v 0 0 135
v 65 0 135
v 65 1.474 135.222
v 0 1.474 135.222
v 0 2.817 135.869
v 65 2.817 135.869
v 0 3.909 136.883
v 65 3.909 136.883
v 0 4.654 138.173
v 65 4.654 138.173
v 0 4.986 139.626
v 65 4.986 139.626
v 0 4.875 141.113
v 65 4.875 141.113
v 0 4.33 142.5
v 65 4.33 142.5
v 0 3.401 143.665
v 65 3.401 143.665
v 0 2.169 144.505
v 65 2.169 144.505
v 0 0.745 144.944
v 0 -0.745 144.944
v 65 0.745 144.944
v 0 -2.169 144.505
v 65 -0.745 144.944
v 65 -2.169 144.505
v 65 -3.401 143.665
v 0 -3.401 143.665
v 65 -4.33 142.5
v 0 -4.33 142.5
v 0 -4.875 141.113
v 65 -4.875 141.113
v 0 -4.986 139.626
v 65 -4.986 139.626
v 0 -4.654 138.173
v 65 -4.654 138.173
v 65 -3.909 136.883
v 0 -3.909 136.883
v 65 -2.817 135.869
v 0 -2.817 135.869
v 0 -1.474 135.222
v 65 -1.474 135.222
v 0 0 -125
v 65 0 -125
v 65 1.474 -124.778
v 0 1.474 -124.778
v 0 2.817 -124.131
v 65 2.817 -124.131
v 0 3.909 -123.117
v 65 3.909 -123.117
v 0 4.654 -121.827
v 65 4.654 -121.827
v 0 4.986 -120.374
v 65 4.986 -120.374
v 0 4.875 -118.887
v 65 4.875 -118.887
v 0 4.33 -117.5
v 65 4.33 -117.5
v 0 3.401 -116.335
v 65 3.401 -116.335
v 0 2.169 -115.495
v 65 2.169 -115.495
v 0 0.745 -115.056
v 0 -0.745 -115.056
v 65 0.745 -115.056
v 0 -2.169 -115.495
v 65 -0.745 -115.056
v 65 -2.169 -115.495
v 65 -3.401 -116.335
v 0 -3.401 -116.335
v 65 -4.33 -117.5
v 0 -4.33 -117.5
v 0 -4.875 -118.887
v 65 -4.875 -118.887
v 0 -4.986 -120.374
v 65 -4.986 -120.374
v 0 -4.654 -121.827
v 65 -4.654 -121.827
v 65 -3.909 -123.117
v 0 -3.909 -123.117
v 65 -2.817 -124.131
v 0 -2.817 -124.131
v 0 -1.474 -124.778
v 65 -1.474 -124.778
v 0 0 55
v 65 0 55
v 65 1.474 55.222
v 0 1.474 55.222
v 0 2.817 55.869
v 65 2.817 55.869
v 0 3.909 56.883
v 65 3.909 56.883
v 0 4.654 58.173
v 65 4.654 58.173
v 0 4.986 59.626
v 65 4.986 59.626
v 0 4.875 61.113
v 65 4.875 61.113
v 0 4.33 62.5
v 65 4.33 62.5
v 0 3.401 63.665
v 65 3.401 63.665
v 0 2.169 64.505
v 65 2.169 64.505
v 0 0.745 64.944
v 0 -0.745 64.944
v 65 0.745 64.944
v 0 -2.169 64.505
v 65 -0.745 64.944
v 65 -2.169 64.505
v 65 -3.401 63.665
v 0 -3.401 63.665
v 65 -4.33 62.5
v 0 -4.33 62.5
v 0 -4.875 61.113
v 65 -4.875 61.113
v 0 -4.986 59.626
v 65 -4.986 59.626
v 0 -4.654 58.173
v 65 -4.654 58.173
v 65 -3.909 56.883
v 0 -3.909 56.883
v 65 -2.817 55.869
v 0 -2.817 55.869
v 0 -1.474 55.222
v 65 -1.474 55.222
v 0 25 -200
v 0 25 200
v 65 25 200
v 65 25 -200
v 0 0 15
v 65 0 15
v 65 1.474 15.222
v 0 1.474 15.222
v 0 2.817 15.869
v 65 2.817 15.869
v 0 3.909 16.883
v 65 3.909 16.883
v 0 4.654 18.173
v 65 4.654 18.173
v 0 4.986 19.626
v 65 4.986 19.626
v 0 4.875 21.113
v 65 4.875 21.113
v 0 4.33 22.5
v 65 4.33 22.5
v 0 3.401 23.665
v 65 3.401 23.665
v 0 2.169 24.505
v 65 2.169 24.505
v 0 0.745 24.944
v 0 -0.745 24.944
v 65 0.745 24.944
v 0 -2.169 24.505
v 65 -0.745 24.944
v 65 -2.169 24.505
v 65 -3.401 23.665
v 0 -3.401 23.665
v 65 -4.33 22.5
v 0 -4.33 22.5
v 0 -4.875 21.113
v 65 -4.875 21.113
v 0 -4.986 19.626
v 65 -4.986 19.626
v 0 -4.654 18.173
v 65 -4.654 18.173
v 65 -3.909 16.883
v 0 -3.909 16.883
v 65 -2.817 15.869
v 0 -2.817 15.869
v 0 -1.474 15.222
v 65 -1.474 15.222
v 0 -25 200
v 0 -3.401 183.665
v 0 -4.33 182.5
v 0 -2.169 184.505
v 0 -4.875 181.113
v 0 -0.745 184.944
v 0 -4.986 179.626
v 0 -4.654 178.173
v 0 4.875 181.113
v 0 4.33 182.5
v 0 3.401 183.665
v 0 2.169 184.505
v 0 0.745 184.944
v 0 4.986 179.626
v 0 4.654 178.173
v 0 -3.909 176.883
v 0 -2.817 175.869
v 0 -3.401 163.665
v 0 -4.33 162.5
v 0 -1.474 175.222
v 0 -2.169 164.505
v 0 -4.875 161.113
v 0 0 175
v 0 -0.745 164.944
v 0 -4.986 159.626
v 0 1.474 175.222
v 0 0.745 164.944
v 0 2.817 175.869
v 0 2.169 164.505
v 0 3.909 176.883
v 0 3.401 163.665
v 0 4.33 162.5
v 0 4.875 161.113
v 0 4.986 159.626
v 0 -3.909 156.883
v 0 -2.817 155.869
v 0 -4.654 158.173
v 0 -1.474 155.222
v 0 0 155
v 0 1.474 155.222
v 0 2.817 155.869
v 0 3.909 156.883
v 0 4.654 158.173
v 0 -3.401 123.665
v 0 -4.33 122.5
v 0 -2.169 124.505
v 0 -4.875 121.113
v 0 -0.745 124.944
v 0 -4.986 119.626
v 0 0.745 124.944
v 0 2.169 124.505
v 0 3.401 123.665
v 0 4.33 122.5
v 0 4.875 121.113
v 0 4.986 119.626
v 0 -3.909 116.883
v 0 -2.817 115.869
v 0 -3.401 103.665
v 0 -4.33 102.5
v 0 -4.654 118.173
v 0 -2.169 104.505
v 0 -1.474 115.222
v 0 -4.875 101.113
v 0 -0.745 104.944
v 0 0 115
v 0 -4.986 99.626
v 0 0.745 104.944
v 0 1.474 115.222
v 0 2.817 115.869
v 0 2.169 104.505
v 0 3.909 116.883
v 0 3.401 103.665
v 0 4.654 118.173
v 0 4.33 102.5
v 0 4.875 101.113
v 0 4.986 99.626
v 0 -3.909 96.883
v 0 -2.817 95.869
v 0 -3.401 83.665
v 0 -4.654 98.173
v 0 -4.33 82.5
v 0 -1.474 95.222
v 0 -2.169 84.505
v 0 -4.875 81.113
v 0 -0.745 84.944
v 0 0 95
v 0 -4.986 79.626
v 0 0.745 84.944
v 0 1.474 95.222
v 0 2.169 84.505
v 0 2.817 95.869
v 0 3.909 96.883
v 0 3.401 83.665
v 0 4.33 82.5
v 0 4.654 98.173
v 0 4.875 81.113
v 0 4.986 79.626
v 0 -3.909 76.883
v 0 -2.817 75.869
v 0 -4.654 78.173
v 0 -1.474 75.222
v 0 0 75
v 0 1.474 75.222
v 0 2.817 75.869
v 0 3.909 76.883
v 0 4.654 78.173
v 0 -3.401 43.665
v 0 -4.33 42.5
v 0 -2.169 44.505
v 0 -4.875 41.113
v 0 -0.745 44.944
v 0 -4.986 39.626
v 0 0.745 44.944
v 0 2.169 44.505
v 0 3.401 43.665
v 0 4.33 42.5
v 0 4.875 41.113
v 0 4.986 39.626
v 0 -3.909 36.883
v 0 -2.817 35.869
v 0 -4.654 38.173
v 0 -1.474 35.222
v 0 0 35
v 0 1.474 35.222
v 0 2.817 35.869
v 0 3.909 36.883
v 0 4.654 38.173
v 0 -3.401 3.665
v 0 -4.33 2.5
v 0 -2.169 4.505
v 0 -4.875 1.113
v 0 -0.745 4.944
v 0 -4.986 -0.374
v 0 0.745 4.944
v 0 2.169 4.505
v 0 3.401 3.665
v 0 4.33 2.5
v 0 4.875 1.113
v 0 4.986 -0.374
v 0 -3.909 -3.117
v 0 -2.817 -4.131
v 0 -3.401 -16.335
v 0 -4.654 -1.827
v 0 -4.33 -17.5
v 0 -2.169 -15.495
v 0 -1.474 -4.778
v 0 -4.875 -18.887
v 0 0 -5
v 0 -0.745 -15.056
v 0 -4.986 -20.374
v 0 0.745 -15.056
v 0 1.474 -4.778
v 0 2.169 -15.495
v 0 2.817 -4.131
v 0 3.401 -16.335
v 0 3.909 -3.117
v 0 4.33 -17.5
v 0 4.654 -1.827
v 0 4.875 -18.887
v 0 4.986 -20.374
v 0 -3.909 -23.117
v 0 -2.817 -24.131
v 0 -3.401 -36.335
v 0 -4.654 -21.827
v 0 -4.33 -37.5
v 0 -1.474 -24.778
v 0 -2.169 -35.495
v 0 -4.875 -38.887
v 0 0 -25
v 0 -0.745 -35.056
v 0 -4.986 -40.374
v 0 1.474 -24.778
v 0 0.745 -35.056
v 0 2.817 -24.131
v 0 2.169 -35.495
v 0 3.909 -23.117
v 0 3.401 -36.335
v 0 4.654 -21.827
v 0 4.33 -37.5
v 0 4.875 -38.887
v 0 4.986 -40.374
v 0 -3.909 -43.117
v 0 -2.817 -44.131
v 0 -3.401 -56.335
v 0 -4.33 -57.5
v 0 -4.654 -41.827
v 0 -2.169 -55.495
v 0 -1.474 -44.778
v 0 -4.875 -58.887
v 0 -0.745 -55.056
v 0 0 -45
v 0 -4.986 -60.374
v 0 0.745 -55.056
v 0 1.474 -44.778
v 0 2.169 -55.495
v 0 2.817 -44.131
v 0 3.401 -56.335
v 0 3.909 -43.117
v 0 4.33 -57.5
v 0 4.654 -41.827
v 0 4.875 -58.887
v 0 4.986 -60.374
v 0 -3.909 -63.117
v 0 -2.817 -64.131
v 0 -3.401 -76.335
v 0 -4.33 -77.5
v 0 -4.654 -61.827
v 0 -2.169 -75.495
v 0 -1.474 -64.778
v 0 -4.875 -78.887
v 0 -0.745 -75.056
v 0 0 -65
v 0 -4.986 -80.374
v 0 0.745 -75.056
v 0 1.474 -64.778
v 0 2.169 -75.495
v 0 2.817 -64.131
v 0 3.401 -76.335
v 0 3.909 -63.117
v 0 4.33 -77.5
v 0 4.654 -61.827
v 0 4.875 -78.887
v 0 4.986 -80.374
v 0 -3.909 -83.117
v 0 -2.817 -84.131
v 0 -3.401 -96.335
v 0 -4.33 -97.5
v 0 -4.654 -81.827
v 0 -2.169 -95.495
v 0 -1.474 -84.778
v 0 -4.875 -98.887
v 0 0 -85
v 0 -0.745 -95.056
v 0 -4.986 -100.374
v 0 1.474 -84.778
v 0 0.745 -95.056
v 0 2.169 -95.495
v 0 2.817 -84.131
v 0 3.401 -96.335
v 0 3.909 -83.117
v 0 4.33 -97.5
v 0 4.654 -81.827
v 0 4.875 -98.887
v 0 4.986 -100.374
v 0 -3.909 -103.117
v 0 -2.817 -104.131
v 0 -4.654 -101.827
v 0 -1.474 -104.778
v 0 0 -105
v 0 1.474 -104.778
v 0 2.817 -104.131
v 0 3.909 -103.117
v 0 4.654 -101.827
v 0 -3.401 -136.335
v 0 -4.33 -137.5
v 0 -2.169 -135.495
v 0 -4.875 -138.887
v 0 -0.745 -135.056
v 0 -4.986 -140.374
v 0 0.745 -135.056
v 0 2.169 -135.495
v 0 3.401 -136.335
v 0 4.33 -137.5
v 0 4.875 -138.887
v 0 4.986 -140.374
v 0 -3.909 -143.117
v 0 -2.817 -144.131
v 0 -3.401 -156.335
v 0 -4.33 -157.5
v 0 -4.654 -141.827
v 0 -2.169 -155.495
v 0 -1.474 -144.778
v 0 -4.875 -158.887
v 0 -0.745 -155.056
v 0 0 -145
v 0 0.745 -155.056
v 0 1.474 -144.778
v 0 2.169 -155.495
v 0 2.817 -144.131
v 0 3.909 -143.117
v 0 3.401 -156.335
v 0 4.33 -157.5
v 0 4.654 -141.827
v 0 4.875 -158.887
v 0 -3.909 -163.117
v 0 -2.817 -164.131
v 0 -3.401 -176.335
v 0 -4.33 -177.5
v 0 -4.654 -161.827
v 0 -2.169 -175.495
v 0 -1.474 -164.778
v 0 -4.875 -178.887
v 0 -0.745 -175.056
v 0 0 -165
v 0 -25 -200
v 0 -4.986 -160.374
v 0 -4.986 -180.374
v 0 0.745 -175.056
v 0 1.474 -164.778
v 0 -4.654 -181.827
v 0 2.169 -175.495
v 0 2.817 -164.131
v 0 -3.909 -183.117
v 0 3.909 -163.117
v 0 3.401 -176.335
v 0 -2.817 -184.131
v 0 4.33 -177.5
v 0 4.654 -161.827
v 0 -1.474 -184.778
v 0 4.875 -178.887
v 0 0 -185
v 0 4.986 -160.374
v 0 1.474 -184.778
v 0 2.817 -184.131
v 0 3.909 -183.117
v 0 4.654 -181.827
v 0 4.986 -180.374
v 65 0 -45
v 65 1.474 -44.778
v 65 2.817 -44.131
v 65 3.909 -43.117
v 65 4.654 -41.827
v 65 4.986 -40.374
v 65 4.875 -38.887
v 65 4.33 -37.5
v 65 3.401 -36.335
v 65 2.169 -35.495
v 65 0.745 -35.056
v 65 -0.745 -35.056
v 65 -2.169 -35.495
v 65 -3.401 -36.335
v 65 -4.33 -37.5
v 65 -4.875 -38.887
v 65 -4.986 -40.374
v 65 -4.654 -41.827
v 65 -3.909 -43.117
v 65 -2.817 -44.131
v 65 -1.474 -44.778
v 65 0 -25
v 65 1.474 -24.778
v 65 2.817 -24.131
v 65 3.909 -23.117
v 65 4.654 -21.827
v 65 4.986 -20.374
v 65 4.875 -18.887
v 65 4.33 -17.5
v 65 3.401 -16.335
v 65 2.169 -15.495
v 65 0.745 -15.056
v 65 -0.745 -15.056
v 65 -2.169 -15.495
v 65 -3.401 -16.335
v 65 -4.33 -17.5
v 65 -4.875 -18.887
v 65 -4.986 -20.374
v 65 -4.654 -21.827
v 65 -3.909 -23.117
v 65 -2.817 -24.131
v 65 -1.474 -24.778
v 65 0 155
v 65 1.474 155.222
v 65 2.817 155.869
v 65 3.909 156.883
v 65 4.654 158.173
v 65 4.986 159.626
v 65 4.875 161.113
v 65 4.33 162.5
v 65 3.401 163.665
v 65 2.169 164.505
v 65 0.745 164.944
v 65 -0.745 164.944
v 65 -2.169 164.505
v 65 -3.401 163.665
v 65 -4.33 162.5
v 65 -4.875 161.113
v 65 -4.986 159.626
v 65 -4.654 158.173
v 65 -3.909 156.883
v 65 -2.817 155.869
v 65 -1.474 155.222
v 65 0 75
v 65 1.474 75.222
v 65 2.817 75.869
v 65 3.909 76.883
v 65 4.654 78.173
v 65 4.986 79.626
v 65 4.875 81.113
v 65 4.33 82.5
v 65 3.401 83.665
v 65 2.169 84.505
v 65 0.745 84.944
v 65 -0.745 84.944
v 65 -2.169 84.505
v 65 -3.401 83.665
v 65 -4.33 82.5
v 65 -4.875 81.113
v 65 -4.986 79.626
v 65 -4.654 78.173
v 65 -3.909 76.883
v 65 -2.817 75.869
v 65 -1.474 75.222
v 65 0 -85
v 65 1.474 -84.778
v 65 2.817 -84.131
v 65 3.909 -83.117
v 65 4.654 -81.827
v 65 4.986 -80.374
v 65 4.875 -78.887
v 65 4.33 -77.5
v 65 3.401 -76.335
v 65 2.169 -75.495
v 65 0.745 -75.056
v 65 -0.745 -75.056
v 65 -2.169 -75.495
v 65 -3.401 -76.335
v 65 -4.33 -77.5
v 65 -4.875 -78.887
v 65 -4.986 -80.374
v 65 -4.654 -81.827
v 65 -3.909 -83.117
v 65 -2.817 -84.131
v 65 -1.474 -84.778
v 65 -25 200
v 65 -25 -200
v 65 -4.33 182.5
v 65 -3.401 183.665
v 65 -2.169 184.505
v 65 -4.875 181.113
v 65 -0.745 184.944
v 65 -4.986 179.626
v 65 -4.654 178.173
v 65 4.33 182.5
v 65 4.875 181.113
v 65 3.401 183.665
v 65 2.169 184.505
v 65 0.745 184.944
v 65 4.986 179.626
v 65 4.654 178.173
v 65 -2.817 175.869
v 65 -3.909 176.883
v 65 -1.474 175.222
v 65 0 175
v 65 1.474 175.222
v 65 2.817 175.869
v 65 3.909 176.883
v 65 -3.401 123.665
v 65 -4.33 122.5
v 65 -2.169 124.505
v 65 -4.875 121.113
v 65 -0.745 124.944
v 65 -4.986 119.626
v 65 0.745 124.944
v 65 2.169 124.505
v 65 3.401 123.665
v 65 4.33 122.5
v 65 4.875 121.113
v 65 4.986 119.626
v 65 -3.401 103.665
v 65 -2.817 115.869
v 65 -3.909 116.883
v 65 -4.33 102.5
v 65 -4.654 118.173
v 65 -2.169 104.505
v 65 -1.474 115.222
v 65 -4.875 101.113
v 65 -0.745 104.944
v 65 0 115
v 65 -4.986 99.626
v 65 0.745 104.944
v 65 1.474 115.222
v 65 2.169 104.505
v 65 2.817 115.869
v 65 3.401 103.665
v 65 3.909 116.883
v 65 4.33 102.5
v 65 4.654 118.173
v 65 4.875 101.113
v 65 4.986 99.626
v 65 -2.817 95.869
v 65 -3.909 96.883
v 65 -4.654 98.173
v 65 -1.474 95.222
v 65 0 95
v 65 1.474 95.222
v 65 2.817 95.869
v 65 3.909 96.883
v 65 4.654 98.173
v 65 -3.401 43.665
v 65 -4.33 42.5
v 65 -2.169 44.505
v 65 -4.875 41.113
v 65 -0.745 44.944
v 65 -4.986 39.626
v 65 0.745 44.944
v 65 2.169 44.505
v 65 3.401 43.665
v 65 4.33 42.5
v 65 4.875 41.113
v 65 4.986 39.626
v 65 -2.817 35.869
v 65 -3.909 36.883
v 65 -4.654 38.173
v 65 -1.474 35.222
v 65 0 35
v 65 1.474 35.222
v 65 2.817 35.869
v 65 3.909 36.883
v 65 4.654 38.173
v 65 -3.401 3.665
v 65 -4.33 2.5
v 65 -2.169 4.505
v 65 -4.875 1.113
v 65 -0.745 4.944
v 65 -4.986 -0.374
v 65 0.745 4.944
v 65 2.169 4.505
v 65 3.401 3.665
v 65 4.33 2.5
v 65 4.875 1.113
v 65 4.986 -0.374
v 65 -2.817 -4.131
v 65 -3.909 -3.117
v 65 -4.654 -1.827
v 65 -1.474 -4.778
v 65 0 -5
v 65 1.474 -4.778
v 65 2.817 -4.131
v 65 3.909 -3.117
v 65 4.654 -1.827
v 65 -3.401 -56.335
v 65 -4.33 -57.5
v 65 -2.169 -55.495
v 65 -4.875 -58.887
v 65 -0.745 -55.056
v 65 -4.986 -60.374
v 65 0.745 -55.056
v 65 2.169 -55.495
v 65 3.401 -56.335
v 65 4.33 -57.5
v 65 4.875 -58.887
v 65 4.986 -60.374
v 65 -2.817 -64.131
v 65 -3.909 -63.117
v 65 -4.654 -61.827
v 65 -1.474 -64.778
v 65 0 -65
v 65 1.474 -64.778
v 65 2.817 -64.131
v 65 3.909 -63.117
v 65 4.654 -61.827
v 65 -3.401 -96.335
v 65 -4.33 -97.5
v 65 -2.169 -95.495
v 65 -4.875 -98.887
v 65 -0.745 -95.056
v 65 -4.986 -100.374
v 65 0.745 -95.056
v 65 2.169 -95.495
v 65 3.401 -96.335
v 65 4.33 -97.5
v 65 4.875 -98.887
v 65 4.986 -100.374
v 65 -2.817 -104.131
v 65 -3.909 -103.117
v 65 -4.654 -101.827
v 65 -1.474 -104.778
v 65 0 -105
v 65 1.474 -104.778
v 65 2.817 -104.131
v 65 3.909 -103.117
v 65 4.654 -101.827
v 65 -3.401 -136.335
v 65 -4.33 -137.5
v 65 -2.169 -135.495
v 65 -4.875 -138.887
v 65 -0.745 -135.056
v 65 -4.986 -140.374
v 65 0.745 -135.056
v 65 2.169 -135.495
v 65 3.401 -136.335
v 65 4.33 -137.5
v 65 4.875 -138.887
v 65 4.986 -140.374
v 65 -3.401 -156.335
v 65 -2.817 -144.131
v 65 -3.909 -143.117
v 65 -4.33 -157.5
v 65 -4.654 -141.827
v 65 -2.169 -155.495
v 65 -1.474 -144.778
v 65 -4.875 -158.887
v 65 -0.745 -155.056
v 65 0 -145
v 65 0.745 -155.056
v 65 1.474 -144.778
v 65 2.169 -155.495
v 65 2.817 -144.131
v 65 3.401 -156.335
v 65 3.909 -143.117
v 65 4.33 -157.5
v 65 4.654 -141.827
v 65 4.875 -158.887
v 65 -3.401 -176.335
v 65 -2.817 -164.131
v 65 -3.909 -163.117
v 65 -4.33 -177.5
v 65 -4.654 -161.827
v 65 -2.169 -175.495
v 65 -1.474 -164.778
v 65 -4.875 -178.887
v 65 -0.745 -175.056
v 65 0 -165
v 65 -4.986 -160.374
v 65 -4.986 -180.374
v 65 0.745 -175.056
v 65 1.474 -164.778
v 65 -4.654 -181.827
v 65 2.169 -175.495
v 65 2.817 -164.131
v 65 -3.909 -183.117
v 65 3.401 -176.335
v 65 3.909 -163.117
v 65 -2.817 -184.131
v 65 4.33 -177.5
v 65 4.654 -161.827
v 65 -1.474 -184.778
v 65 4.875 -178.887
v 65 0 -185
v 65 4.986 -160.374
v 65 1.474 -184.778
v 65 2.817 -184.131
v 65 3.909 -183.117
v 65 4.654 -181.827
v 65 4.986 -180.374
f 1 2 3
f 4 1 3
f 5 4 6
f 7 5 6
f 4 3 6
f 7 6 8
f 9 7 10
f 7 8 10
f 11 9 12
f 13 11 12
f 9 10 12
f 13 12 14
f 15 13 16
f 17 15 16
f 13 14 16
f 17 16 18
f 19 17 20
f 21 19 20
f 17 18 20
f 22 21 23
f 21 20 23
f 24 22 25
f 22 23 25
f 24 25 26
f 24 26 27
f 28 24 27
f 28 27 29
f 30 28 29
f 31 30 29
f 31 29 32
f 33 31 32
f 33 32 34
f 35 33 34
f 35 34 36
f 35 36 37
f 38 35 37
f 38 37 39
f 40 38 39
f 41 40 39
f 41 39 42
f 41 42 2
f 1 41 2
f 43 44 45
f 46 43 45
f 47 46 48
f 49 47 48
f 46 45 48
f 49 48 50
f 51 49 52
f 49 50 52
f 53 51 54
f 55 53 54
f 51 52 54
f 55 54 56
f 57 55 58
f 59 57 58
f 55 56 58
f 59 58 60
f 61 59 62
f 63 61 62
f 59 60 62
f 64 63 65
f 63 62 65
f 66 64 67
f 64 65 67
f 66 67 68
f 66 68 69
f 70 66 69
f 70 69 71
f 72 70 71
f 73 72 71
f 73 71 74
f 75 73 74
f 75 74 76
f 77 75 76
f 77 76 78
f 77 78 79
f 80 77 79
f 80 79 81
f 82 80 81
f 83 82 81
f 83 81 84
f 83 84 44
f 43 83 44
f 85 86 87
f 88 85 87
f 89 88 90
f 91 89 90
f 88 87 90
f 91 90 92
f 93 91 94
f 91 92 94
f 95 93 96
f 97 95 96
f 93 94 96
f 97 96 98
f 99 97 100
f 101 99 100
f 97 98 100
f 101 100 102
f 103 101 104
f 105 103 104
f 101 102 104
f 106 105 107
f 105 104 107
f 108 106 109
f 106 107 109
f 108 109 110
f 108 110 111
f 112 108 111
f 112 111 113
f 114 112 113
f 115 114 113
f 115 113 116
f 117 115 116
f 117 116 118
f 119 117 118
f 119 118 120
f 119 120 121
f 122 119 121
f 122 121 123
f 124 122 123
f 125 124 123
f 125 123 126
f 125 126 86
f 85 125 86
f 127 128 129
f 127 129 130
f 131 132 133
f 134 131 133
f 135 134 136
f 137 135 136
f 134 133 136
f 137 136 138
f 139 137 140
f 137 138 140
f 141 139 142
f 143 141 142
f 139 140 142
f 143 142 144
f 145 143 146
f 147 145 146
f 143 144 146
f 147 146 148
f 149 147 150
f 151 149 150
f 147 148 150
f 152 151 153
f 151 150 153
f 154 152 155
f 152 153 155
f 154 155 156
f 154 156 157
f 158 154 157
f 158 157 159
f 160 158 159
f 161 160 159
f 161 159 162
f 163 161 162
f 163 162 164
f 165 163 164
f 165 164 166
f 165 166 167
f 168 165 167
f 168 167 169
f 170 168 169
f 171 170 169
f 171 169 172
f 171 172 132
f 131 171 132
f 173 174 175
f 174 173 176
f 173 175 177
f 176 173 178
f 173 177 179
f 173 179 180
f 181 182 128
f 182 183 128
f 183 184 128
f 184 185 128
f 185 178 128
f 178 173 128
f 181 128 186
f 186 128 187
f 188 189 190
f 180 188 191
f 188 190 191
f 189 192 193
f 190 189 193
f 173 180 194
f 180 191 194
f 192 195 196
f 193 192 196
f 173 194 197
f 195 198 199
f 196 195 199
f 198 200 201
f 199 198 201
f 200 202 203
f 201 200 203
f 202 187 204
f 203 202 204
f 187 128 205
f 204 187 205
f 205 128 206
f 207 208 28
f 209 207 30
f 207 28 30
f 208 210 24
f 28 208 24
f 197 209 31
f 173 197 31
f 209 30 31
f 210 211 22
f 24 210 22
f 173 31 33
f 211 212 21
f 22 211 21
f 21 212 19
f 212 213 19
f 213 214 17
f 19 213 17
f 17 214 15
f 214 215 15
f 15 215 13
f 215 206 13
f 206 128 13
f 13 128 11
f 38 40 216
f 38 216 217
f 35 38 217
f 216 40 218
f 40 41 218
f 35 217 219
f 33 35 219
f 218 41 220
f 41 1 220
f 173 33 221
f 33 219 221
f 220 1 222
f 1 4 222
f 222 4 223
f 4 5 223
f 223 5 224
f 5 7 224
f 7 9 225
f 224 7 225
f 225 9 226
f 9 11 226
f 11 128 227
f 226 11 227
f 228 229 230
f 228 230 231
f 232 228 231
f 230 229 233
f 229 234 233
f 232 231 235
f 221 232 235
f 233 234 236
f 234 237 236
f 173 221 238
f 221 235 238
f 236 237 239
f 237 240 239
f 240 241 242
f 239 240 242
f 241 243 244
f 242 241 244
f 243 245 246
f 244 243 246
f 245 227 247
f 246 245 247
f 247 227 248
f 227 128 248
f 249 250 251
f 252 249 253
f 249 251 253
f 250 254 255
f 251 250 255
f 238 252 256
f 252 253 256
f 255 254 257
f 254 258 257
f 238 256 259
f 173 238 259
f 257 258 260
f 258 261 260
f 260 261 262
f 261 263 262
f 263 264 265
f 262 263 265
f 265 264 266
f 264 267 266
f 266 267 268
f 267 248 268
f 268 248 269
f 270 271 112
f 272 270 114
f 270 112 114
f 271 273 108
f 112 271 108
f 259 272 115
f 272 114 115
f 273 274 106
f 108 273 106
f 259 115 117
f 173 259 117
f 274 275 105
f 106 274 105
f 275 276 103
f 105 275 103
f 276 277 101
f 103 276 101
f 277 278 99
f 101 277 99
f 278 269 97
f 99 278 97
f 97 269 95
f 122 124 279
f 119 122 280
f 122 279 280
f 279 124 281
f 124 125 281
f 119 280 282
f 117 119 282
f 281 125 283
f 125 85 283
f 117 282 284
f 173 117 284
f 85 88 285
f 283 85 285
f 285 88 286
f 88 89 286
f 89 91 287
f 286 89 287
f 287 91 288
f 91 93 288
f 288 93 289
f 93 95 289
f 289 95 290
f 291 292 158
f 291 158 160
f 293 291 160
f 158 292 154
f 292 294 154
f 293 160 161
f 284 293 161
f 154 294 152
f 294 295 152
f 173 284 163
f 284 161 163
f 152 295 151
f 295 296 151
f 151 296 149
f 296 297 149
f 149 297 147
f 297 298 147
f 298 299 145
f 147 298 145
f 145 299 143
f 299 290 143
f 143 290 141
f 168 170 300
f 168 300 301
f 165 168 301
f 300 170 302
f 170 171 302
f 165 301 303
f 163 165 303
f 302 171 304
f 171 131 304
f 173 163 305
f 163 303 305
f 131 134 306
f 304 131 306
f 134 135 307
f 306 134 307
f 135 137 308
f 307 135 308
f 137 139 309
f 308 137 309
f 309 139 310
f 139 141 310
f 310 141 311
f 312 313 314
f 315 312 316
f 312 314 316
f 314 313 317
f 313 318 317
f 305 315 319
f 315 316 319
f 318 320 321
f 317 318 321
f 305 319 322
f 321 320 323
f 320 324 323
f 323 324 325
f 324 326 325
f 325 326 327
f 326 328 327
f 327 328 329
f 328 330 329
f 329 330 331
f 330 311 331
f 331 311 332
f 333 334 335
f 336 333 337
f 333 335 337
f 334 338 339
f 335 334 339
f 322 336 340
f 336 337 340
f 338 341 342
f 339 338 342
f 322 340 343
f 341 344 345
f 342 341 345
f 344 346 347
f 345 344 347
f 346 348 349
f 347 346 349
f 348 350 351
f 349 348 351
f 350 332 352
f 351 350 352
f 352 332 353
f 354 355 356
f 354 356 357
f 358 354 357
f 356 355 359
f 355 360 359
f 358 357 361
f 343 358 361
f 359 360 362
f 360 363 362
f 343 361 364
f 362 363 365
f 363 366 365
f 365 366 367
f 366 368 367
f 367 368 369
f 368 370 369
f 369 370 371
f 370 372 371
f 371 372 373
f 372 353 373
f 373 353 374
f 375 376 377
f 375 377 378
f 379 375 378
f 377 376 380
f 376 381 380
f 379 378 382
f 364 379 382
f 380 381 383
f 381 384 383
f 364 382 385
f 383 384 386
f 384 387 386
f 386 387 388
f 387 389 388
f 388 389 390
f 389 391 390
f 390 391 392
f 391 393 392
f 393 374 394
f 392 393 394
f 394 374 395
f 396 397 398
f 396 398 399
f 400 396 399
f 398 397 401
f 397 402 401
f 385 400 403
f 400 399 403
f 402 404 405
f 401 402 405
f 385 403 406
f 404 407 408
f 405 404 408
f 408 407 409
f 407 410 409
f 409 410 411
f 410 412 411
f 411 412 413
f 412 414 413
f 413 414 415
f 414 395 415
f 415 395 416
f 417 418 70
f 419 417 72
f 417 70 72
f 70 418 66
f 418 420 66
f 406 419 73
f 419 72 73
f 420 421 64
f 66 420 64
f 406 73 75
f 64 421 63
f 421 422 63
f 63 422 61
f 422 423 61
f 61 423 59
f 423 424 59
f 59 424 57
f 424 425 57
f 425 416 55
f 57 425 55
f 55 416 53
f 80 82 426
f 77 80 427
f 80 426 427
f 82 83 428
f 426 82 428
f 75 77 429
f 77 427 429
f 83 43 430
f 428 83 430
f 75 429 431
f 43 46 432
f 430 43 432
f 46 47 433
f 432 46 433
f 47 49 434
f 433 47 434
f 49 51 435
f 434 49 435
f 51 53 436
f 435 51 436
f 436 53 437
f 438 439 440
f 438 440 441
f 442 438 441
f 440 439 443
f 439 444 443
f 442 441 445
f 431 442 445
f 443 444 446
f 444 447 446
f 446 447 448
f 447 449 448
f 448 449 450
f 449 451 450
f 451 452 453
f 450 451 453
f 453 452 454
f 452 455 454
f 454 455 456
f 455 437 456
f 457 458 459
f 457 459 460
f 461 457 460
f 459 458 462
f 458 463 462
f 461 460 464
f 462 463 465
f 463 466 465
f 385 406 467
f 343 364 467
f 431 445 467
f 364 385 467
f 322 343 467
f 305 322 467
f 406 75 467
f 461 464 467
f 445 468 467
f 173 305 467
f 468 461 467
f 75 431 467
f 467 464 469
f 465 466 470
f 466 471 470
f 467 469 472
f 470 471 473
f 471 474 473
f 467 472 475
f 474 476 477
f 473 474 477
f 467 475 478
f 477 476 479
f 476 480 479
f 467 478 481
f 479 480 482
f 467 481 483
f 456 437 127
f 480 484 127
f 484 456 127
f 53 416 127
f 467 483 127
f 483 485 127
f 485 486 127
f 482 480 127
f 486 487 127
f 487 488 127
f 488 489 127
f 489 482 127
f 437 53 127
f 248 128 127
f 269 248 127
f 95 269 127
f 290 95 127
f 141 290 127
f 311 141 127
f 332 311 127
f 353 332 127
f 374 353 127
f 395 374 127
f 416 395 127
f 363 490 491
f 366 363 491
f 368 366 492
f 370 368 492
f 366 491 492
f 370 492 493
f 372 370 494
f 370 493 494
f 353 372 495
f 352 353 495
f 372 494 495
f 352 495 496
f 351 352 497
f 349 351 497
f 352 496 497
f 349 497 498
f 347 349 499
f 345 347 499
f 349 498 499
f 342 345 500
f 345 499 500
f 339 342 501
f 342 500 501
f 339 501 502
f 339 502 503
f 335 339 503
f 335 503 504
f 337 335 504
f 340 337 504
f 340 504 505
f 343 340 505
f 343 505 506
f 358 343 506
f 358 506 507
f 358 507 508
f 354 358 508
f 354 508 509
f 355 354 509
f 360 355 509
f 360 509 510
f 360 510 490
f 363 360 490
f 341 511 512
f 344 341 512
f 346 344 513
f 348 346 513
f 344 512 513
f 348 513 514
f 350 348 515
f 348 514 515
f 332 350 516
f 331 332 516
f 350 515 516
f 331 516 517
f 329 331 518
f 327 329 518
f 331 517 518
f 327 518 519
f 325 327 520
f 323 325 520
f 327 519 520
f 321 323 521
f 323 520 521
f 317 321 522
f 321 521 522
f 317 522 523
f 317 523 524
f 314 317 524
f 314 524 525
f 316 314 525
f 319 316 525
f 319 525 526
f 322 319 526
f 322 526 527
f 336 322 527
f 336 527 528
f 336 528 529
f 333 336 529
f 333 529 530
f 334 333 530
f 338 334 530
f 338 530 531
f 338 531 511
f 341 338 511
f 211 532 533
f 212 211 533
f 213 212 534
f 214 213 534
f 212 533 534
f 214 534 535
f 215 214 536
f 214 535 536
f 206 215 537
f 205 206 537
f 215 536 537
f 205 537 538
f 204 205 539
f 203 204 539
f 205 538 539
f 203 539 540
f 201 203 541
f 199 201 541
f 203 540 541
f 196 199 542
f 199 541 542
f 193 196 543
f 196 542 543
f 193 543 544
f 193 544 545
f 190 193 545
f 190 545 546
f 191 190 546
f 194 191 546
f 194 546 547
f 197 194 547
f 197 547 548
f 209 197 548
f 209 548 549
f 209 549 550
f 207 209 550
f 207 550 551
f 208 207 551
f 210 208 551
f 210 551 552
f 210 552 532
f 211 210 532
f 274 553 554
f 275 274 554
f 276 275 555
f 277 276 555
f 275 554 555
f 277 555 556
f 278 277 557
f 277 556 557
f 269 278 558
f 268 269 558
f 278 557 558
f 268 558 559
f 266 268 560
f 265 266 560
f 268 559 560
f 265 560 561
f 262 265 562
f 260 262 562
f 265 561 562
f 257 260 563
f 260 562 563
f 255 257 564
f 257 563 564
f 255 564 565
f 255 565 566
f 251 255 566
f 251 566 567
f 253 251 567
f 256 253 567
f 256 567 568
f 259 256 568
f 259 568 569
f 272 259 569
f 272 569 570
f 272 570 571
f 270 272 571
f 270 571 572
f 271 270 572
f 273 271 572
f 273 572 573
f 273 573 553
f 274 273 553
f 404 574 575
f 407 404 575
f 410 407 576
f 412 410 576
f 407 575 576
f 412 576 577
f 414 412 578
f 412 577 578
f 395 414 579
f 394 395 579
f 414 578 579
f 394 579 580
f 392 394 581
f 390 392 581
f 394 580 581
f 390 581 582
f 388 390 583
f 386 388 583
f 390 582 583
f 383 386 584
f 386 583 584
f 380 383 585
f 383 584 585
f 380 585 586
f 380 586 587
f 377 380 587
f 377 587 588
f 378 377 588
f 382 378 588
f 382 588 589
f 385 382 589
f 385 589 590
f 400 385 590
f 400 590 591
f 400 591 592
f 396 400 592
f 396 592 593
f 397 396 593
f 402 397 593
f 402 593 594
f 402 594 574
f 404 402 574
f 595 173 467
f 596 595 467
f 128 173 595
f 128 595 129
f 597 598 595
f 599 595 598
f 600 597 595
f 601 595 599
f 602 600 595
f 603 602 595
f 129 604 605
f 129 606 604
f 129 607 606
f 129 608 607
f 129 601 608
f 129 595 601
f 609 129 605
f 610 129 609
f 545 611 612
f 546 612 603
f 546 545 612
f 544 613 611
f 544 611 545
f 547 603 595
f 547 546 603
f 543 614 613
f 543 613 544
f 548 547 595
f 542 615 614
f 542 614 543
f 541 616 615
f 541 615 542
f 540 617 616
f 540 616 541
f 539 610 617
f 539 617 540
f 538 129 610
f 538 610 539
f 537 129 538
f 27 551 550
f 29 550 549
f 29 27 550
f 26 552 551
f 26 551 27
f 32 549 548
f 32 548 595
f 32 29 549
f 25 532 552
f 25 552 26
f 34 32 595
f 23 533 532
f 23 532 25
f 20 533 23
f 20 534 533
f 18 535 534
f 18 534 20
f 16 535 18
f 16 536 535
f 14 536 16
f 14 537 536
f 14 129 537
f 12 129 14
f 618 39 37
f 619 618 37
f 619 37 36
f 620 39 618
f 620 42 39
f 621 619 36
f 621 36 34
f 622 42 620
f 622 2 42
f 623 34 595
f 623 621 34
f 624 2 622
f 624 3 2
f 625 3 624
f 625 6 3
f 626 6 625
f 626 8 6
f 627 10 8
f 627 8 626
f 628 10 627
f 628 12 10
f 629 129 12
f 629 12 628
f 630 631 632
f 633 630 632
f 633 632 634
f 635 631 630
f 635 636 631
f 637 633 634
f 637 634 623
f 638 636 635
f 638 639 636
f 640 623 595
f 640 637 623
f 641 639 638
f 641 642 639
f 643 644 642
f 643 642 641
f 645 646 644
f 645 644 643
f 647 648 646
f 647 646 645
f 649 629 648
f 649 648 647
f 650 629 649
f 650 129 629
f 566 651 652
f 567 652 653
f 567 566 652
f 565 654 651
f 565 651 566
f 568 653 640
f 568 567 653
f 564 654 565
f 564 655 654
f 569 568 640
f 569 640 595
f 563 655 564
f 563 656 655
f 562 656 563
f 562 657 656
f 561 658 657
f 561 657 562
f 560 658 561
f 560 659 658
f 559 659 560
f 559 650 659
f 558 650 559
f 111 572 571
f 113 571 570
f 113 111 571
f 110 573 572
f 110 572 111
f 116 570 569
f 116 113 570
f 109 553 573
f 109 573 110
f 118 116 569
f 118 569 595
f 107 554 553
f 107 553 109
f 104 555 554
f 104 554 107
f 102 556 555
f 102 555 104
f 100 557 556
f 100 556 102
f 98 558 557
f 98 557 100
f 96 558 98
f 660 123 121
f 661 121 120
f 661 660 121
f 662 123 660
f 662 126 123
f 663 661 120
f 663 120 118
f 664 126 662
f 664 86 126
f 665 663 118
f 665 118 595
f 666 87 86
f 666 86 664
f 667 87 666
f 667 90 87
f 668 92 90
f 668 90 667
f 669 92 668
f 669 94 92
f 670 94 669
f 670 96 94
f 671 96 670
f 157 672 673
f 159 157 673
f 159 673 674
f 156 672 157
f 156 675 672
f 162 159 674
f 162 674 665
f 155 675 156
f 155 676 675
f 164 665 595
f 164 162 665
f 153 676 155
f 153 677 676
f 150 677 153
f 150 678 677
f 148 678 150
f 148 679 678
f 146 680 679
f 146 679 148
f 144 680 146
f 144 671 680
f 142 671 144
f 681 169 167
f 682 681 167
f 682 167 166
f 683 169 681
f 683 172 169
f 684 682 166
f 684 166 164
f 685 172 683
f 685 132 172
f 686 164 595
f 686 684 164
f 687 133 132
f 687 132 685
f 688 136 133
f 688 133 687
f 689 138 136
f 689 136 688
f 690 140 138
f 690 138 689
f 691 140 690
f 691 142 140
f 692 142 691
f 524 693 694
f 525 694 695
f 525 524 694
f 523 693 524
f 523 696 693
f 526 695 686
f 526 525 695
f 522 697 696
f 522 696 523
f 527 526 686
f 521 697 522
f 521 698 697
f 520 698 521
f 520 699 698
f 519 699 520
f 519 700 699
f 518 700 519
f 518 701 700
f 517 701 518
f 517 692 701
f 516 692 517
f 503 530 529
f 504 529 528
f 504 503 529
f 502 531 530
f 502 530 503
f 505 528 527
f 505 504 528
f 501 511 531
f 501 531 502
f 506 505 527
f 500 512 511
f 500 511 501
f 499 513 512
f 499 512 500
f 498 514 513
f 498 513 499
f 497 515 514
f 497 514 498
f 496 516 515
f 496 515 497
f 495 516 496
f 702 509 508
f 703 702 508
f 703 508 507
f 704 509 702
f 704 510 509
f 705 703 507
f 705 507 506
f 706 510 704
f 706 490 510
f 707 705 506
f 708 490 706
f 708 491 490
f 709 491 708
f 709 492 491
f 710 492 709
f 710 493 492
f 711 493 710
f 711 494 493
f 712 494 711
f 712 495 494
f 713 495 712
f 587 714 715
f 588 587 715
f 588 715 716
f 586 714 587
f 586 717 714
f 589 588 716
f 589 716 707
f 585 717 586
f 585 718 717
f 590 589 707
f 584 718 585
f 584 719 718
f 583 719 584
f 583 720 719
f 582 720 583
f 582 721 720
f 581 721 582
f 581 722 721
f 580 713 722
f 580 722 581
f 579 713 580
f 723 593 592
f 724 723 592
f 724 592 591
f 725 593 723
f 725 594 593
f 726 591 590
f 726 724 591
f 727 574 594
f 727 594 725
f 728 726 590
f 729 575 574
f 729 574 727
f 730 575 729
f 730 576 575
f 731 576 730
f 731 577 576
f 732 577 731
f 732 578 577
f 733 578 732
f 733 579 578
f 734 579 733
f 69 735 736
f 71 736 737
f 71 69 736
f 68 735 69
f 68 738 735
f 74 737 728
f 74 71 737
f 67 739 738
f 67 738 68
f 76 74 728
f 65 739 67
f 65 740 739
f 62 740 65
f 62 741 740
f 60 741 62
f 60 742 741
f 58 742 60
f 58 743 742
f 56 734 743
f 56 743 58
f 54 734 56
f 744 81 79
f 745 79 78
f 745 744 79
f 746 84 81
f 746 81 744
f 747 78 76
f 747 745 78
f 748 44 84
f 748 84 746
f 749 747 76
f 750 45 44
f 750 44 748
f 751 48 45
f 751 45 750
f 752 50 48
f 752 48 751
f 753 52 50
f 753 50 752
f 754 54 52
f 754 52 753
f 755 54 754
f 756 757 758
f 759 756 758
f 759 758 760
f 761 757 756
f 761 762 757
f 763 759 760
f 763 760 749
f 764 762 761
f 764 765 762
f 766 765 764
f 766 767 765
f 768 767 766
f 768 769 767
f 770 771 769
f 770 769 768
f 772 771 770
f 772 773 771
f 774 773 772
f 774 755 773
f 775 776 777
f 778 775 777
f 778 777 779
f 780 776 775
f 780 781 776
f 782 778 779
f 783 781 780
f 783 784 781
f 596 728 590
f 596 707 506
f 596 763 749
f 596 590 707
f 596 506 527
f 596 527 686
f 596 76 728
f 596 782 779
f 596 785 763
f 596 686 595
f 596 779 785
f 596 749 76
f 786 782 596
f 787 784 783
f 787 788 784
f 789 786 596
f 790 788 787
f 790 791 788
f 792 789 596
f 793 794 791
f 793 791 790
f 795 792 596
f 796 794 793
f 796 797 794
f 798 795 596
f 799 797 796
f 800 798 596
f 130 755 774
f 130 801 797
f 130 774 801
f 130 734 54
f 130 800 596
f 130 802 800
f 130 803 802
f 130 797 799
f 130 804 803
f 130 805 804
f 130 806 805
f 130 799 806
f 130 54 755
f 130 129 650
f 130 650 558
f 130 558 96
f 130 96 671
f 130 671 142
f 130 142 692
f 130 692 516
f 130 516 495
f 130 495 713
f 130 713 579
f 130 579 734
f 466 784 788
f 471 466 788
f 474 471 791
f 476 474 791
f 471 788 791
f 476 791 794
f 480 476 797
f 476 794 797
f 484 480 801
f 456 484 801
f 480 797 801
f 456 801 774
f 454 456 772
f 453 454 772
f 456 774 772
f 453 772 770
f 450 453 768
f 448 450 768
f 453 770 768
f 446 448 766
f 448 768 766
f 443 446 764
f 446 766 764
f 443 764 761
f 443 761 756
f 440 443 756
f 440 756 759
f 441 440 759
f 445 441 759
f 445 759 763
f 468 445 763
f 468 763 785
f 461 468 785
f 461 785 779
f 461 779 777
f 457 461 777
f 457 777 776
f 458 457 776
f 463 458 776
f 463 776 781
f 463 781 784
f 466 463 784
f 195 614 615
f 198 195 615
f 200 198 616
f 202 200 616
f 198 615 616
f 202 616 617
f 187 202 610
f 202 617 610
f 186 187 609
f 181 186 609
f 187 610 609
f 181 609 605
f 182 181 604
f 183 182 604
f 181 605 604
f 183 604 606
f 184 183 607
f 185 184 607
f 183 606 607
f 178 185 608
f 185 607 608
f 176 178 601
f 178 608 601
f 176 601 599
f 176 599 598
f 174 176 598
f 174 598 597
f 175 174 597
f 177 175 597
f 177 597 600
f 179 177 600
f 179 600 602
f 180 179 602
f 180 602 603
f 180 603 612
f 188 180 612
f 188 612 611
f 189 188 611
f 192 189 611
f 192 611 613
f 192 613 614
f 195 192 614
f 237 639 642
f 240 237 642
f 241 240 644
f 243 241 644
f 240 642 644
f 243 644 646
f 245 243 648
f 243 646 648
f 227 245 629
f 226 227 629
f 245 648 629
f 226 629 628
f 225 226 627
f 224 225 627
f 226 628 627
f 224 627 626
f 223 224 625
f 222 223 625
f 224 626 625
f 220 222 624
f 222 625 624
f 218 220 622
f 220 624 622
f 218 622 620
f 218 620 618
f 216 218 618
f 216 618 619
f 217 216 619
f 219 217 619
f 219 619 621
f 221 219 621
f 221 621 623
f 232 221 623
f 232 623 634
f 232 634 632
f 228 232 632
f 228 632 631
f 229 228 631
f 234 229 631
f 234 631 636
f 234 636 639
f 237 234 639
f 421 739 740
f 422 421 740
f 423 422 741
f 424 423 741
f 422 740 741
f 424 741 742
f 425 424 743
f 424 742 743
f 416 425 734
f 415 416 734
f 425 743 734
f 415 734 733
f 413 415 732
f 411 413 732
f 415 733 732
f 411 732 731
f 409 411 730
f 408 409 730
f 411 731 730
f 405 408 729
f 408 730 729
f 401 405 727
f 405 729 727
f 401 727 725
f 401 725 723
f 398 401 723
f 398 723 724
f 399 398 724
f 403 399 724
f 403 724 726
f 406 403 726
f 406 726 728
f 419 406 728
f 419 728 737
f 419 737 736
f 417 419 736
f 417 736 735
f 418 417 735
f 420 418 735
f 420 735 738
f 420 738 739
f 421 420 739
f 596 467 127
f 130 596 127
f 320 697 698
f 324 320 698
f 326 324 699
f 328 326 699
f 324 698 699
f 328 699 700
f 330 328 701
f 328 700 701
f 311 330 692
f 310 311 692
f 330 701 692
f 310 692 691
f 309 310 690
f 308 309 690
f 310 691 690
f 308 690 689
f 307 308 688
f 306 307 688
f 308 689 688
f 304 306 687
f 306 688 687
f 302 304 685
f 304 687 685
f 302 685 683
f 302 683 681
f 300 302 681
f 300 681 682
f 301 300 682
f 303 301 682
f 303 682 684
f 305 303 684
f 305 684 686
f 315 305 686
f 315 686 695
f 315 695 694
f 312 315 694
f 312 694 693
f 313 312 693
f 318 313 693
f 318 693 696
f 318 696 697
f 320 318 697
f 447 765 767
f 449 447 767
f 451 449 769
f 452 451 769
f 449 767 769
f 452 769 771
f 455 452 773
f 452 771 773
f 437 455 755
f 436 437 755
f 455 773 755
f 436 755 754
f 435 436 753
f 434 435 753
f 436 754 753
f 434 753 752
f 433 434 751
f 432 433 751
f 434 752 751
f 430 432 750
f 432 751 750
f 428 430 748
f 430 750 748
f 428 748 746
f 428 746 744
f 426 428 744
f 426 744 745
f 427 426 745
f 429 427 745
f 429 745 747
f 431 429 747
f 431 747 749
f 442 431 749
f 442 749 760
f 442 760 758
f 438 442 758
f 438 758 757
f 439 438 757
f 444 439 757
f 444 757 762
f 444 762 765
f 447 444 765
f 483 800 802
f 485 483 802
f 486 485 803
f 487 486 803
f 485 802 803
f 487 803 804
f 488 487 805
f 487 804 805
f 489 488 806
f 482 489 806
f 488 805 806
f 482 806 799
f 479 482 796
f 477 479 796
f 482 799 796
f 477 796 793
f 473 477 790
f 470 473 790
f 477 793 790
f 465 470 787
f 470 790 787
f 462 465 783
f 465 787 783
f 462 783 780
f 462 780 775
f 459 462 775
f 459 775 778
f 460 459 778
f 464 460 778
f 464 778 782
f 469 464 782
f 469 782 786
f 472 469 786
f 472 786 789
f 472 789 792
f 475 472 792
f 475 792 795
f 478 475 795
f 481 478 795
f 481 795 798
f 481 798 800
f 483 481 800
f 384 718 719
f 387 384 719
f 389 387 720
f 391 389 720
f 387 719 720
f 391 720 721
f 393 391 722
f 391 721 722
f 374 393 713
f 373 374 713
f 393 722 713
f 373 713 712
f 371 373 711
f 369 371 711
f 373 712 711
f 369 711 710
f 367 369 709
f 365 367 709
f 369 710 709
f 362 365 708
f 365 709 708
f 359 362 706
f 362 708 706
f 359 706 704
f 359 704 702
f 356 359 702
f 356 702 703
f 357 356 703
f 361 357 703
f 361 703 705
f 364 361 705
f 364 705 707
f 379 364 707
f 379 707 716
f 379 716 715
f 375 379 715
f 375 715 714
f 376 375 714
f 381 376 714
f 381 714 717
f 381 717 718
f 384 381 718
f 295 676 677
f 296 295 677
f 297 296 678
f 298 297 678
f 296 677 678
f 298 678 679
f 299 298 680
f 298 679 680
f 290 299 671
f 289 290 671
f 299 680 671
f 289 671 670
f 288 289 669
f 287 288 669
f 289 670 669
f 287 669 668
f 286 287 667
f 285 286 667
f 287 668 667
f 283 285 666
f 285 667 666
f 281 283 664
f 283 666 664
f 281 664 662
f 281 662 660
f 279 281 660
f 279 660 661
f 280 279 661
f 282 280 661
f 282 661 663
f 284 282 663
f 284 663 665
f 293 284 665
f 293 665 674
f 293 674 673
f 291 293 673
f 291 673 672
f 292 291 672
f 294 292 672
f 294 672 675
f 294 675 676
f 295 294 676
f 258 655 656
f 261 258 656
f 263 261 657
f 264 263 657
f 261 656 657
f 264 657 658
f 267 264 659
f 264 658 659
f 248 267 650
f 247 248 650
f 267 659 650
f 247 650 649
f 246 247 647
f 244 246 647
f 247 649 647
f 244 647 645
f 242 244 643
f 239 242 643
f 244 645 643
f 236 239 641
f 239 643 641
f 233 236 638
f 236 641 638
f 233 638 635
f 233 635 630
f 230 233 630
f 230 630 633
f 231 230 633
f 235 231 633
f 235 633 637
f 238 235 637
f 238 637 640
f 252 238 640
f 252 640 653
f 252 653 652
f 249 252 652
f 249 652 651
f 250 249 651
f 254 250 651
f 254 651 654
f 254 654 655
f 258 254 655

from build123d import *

# Parameters (mm, degrees)
SKETCH1_W           = 400
SKETCH1_H           = 50
BOSS_EXTRUDE1_DEPTH = 65
SKETCH2_R           = 5
CUT_EXTRUDE1_DEPTH  = 66


with BuildPart() as part:
    # Sketch1 → Boss-Extrude1 (new body)
    with BuildSketch(Plane(origin=(0, 0, 0), x_dir=(0, 0, -1), z_dir=(1, 0, 0))):
        Rectangle(SKETCH1_W, SKETCH1_H)
    extrude(amount=BOSS_EXTRUDE1_DEPTH)

    # Sketch2 → Cut-Extrude1 (cut, through all)
    with BuildSketch(Plane(origin=(65, 0, 0), x_dir=(0, 0, -1), z_dir=(1, 0, 0))):
        with Locations((-180, 0)):
            Circle(SKETCH2_R)
        with Locations((-160, 0)):
            Circle(SKETCH2_R)
        with Locations((-140, 0)):
            Circle(SKETCH2_R)
        with Locations((-120, 0)):
            Circle(SKETCH2_R)
        with Locations((-100, 0)):
            Circle(SKETCH2_R)
        with Locations((-80, 0)):
            Circle(SKETCH2_R)
        with Locations((-60, 0)):
            Circle(SKETCH2_R)
        with Locations((-40, 0)):
            Circle(SKETCH2_R)
        with Locations((-20, 0)):
            Circle(SKETCH2_R)
        Circle(SKETCH2_R)
        with Locations((20, 0)):
            Circle(SKETCH2_R)
        with Locations((40, 0)):
            Circle(SKETCH2_R)
        with Locations((60, 0)):
            Circle(SKETCH2_R)
        with Locations((80, 0)):
            Circle(SKETCH2_R)
        with Locations((100, 0)):
            Circle(SKETCH2_R)
        with Locations((120, 0)):
            Circle(SKETCH2_R)
        with Locations((140, 0)):
            Circle(SKETCH2_R)
        with Locations((160, 0)):
            Circle(SKETCH2_R)
        with Locations((180, 0)):
            Circle(SKETCH2_R)
    extrude(amount=-CUT_EXTRUDE1_DEPTH, mode=Mode.SUBTRACT)


solid = part.part
